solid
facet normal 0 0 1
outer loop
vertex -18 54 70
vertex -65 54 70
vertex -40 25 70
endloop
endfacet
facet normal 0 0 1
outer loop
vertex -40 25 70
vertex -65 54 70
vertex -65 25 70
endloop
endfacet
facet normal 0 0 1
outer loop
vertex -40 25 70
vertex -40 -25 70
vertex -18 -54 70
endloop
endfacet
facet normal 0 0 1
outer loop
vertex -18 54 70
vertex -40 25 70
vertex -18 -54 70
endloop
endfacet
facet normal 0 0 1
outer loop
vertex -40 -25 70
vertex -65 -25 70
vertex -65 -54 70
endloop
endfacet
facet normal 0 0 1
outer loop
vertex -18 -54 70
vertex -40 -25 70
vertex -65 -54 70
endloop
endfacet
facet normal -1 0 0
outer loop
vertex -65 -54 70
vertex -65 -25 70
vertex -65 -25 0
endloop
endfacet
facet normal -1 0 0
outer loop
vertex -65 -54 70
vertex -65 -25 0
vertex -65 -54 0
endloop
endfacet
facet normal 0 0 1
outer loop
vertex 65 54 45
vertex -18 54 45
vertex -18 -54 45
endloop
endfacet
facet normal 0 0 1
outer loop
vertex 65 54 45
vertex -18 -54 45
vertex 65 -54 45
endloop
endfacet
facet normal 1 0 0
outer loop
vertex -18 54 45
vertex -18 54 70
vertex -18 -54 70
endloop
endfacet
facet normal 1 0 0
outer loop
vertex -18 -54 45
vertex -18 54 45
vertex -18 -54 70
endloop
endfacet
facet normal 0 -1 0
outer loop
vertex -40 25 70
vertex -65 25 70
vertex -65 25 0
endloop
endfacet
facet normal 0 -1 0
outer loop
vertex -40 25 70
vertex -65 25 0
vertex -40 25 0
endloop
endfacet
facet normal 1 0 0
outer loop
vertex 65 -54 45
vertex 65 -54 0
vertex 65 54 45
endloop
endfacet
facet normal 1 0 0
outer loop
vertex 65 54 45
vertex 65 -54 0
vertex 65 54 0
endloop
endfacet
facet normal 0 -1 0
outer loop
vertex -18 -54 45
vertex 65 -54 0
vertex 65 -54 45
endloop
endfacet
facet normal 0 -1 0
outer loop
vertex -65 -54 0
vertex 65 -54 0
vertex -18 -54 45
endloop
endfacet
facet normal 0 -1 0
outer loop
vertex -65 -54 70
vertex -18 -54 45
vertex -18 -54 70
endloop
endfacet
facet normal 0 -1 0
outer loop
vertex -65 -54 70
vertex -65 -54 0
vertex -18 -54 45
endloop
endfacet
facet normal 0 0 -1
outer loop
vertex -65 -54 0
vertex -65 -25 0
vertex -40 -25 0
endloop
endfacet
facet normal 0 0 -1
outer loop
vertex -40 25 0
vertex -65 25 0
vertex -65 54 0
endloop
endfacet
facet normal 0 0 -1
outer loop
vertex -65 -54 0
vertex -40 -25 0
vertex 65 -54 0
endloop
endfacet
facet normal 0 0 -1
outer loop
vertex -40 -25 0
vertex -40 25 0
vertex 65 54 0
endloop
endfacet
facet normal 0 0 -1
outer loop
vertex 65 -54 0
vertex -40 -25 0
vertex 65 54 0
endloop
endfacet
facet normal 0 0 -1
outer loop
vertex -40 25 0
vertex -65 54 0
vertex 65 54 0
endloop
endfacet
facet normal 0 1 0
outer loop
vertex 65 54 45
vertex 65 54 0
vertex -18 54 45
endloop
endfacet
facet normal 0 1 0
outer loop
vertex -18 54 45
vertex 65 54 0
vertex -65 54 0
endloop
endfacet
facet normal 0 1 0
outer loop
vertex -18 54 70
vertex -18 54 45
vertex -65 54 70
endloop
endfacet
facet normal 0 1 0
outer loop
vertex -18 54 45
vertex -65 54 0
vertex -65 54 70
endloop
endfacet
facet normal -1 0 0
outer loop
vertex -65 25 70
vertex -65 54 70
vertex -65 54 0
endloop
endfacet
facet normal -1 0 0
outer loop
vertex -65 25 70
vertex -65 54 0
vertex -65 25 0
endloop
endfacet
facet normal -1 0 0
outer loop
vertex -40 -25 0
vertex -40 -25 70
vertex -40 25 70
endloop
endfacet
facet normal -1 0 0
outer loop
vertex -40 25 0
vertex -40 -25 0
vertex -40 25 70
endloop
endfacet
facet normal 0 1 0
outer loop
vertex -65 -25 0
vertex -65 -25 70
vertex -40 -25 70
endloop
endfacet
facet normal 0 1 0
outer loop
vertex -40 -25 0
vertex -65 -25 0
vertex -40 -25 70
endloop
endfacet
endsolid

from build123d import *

# Parameters (mm, degrees)
F0_W     = 130
F0_H     = 108
F1_DEPTH = 45
F2_W     = 108
F2_H     = 25
F3_DEPTH = 47
F4_W     = 25
F4_H     = 50
F5_DEPTH = 70.001


with BuildPart() as f1:
    # F0 (on Top) → F1 (new body)
    with BuildSketch(Plane.XY):
        Rectangle(F0_W, F0_H)
    extrude(amount=F1_DEPTH)

    # F2 (on face) → F3 (join)
    with BuildSketch(Plane(origin=(-65, 0, 0), x_dir=(0, -1, 0), z_dir=(-1, 0, 0))):
        with Locations((0, 57.5)):
            Rectangle(F2_W, F2_H)
    extrude(amount=-F3_DEPTH)

    # F4 (on face) → F5 (cut, through all)
    with BuildSketch(Plane.XY.offset(70)):
        with Locations((-52.5, 0)):
            Rectangle(F4_W, F4_H)
    extrude(amount=-F5_DEPTH, mode=Mode.SUBTRACT)


solid = f1.part
